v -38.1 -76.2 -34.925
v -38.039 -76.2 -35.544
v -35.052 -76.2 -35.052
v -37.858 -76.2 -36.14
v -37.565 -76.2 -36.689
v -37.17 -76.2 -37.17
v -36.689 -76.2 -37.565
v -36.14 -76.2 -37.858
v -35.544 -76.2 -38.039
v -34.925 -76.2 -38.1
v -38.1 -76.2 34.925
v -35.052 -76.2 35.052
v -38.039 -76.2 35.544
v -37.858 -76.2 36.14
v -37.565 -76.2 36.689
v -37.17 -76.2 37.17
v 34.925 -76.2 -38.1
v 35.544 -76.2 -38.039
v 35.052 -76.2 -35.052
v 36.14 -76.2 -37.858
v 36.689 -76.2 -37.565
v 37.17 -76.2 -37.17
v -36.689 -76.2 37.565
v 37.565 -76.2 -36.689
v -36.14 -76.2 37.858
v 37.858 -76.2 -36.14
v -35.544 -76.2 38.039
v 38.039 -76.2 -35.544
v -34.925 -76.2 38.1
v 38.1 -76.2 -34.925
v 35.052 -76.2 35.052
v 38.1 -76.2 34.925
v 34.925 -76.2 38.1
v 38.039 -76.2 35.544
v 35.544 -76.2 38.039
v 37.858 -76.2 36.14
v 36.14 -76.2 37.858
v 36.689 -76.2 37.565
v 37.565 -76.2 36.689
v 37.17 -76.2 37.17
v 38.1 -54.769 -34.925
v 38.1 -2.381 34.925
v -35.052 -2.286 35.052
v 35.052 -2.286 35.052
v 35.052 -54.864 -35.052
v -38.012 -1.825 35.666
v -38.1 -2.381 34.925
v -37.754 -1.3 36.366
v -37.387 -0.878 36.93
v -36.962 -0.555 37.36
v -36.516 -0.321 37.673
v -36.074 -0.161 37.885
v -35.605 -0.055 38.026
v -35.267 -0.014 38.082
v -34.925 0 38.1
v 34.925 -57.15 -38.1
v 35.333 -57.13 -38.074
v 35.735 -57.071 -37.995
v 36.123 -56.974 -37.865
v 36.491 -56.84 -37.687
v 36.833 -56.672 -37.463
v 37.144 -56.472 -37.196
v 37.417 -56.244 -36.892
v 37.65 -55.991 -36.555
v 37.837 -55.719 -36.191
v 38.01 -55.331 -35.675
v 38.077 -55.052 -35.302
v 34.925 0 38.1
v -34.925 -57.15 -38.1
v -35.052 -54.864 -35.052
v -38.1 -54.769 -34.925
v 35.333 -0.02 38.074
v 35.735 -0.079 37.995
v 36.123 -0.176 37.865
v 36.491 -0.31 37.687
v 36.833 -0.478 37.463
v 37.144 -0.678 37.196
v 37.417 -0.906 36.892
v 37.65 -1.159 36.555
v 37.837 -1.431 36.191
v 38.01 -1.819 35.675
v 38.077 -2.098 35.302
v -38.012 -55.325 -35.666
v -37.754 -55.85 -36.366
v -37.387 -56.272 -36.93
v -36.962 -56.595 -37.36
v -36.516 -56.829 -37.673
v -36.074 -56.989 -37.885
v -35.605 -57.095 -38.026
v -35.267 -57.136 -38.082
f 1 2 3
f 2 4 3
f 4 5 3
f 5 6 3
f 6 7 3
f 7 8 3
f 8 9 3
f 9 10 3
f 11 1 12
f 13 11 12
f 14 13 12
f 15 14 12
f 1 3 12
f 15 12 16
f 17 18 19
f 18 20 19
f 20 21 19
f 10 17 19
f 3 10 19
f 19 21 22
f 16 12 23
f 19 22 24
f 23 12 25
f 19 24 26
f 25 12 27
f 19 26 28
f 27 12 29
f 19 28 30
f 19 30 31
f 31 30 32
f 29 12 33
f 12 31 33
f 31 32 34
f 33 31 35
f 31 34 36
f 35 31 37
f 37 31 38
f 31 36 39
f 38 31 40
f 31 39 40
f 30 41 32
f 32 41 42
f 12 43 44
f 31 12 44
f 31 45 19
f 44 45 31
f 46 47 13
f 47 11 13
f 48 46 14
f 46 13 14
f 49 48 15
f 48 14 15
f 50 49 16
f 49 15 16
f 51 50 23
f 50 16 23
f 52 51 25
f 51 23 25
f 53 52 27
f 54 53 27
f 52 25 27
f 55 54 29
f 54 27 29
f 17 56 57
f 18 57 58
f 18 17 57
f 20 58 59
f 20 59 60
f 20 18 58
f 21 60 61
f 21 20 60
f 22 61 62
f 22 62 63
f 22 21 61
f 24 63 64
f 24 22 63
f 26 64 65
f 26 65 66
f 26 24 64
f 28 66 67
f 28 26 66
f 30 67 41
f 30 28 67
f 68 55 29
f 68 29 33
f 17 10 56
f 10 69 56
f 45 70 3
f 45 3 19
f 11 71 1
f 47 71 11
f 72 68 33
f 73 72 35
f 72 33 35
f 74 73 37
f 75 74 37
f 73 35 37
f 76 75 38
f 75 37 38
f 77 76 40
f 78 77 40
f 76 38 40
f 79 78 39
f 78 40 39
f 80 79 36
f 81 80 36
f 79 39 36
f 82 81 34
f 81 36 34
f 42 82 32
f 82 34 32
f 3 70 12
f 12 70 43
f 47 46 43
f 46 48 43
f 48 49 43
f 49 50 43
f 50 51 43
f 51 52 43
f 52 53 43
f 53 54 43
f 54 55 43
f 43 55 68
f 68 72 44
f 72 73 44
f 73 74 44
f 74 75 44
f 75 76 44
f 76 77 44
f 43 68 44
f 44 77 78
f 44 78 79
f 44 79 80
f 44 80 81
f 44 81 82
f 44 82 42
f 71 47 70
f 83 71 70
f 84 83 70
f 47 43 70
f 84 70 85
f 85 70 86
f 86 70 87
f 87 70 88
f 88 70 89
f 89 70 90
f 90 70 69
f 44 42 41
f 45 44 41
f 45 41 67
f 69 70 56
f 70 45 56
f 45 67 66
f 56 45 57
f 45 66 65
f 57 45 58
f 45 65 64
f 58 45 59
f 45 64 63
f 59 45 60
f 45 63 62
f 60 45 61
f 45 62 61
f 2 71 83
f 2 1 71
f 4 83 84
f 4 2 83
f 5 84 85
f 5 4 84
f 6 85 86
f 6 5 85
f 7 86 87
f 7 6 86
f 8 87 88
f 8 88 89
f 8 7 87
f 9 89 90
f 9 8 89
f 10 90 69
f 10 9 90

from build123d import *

# Parameters (mm, degrees)
F0_W     = 76.2
F0_H     = 76.2
F0_W_2   = 70.104
F0_H_2   = 70.104
F1_DEPTH = 241.3
F3_DEPTH = 76.201
F4_W     = 165.1
F4_H     = 76.2
F5_DEPTH = 76.201
F6_R     = 3.175


with BuildPart() as f1:
    # F0 (on Front) → F1 (new body)
    with BuildSketch(Plane.XZ):
        Rectangle(F0_W, F0_H)
        Rectangle(F0_W_2, F0_H_2, mode=Mode.SUBTRACT)
    extrude(amount=F1_DEPTH)

    # F2 (on face) → F3 (cut, through all)
    with BuildSketch(Plane.YZ.offset(38.1)):
        Polygon((0, -38.1), (0, 38.1), (-57.15, -38.1), align=None)
    extrude(amount=-F3_DEPTH, mode=Mode.SUBTRACT)

    # F4 (on face) → F5 (cut, through all)
    with BuildSketch(Plane.YZ.offset(38.1)):
        with Locations((-158.75, 0)):
            Rectangle(F4_W, F4_H)
    extrude(amount=-F5_DEPTH, mode=Mode.SUBTRACT)

    # F6
    f6_edges = [f1.edges().sort_by_distance(p)[0] for p in [
        (38.1, -38.1, 38.1),
        (-38.1, -38.1, 38.1),
        (-38.1, -66.675, -38.1),
        (38.1, -66.675, -38.1),
    ]]
    fillet(f6_edges, radius=F6_R)


solid = f1.part
